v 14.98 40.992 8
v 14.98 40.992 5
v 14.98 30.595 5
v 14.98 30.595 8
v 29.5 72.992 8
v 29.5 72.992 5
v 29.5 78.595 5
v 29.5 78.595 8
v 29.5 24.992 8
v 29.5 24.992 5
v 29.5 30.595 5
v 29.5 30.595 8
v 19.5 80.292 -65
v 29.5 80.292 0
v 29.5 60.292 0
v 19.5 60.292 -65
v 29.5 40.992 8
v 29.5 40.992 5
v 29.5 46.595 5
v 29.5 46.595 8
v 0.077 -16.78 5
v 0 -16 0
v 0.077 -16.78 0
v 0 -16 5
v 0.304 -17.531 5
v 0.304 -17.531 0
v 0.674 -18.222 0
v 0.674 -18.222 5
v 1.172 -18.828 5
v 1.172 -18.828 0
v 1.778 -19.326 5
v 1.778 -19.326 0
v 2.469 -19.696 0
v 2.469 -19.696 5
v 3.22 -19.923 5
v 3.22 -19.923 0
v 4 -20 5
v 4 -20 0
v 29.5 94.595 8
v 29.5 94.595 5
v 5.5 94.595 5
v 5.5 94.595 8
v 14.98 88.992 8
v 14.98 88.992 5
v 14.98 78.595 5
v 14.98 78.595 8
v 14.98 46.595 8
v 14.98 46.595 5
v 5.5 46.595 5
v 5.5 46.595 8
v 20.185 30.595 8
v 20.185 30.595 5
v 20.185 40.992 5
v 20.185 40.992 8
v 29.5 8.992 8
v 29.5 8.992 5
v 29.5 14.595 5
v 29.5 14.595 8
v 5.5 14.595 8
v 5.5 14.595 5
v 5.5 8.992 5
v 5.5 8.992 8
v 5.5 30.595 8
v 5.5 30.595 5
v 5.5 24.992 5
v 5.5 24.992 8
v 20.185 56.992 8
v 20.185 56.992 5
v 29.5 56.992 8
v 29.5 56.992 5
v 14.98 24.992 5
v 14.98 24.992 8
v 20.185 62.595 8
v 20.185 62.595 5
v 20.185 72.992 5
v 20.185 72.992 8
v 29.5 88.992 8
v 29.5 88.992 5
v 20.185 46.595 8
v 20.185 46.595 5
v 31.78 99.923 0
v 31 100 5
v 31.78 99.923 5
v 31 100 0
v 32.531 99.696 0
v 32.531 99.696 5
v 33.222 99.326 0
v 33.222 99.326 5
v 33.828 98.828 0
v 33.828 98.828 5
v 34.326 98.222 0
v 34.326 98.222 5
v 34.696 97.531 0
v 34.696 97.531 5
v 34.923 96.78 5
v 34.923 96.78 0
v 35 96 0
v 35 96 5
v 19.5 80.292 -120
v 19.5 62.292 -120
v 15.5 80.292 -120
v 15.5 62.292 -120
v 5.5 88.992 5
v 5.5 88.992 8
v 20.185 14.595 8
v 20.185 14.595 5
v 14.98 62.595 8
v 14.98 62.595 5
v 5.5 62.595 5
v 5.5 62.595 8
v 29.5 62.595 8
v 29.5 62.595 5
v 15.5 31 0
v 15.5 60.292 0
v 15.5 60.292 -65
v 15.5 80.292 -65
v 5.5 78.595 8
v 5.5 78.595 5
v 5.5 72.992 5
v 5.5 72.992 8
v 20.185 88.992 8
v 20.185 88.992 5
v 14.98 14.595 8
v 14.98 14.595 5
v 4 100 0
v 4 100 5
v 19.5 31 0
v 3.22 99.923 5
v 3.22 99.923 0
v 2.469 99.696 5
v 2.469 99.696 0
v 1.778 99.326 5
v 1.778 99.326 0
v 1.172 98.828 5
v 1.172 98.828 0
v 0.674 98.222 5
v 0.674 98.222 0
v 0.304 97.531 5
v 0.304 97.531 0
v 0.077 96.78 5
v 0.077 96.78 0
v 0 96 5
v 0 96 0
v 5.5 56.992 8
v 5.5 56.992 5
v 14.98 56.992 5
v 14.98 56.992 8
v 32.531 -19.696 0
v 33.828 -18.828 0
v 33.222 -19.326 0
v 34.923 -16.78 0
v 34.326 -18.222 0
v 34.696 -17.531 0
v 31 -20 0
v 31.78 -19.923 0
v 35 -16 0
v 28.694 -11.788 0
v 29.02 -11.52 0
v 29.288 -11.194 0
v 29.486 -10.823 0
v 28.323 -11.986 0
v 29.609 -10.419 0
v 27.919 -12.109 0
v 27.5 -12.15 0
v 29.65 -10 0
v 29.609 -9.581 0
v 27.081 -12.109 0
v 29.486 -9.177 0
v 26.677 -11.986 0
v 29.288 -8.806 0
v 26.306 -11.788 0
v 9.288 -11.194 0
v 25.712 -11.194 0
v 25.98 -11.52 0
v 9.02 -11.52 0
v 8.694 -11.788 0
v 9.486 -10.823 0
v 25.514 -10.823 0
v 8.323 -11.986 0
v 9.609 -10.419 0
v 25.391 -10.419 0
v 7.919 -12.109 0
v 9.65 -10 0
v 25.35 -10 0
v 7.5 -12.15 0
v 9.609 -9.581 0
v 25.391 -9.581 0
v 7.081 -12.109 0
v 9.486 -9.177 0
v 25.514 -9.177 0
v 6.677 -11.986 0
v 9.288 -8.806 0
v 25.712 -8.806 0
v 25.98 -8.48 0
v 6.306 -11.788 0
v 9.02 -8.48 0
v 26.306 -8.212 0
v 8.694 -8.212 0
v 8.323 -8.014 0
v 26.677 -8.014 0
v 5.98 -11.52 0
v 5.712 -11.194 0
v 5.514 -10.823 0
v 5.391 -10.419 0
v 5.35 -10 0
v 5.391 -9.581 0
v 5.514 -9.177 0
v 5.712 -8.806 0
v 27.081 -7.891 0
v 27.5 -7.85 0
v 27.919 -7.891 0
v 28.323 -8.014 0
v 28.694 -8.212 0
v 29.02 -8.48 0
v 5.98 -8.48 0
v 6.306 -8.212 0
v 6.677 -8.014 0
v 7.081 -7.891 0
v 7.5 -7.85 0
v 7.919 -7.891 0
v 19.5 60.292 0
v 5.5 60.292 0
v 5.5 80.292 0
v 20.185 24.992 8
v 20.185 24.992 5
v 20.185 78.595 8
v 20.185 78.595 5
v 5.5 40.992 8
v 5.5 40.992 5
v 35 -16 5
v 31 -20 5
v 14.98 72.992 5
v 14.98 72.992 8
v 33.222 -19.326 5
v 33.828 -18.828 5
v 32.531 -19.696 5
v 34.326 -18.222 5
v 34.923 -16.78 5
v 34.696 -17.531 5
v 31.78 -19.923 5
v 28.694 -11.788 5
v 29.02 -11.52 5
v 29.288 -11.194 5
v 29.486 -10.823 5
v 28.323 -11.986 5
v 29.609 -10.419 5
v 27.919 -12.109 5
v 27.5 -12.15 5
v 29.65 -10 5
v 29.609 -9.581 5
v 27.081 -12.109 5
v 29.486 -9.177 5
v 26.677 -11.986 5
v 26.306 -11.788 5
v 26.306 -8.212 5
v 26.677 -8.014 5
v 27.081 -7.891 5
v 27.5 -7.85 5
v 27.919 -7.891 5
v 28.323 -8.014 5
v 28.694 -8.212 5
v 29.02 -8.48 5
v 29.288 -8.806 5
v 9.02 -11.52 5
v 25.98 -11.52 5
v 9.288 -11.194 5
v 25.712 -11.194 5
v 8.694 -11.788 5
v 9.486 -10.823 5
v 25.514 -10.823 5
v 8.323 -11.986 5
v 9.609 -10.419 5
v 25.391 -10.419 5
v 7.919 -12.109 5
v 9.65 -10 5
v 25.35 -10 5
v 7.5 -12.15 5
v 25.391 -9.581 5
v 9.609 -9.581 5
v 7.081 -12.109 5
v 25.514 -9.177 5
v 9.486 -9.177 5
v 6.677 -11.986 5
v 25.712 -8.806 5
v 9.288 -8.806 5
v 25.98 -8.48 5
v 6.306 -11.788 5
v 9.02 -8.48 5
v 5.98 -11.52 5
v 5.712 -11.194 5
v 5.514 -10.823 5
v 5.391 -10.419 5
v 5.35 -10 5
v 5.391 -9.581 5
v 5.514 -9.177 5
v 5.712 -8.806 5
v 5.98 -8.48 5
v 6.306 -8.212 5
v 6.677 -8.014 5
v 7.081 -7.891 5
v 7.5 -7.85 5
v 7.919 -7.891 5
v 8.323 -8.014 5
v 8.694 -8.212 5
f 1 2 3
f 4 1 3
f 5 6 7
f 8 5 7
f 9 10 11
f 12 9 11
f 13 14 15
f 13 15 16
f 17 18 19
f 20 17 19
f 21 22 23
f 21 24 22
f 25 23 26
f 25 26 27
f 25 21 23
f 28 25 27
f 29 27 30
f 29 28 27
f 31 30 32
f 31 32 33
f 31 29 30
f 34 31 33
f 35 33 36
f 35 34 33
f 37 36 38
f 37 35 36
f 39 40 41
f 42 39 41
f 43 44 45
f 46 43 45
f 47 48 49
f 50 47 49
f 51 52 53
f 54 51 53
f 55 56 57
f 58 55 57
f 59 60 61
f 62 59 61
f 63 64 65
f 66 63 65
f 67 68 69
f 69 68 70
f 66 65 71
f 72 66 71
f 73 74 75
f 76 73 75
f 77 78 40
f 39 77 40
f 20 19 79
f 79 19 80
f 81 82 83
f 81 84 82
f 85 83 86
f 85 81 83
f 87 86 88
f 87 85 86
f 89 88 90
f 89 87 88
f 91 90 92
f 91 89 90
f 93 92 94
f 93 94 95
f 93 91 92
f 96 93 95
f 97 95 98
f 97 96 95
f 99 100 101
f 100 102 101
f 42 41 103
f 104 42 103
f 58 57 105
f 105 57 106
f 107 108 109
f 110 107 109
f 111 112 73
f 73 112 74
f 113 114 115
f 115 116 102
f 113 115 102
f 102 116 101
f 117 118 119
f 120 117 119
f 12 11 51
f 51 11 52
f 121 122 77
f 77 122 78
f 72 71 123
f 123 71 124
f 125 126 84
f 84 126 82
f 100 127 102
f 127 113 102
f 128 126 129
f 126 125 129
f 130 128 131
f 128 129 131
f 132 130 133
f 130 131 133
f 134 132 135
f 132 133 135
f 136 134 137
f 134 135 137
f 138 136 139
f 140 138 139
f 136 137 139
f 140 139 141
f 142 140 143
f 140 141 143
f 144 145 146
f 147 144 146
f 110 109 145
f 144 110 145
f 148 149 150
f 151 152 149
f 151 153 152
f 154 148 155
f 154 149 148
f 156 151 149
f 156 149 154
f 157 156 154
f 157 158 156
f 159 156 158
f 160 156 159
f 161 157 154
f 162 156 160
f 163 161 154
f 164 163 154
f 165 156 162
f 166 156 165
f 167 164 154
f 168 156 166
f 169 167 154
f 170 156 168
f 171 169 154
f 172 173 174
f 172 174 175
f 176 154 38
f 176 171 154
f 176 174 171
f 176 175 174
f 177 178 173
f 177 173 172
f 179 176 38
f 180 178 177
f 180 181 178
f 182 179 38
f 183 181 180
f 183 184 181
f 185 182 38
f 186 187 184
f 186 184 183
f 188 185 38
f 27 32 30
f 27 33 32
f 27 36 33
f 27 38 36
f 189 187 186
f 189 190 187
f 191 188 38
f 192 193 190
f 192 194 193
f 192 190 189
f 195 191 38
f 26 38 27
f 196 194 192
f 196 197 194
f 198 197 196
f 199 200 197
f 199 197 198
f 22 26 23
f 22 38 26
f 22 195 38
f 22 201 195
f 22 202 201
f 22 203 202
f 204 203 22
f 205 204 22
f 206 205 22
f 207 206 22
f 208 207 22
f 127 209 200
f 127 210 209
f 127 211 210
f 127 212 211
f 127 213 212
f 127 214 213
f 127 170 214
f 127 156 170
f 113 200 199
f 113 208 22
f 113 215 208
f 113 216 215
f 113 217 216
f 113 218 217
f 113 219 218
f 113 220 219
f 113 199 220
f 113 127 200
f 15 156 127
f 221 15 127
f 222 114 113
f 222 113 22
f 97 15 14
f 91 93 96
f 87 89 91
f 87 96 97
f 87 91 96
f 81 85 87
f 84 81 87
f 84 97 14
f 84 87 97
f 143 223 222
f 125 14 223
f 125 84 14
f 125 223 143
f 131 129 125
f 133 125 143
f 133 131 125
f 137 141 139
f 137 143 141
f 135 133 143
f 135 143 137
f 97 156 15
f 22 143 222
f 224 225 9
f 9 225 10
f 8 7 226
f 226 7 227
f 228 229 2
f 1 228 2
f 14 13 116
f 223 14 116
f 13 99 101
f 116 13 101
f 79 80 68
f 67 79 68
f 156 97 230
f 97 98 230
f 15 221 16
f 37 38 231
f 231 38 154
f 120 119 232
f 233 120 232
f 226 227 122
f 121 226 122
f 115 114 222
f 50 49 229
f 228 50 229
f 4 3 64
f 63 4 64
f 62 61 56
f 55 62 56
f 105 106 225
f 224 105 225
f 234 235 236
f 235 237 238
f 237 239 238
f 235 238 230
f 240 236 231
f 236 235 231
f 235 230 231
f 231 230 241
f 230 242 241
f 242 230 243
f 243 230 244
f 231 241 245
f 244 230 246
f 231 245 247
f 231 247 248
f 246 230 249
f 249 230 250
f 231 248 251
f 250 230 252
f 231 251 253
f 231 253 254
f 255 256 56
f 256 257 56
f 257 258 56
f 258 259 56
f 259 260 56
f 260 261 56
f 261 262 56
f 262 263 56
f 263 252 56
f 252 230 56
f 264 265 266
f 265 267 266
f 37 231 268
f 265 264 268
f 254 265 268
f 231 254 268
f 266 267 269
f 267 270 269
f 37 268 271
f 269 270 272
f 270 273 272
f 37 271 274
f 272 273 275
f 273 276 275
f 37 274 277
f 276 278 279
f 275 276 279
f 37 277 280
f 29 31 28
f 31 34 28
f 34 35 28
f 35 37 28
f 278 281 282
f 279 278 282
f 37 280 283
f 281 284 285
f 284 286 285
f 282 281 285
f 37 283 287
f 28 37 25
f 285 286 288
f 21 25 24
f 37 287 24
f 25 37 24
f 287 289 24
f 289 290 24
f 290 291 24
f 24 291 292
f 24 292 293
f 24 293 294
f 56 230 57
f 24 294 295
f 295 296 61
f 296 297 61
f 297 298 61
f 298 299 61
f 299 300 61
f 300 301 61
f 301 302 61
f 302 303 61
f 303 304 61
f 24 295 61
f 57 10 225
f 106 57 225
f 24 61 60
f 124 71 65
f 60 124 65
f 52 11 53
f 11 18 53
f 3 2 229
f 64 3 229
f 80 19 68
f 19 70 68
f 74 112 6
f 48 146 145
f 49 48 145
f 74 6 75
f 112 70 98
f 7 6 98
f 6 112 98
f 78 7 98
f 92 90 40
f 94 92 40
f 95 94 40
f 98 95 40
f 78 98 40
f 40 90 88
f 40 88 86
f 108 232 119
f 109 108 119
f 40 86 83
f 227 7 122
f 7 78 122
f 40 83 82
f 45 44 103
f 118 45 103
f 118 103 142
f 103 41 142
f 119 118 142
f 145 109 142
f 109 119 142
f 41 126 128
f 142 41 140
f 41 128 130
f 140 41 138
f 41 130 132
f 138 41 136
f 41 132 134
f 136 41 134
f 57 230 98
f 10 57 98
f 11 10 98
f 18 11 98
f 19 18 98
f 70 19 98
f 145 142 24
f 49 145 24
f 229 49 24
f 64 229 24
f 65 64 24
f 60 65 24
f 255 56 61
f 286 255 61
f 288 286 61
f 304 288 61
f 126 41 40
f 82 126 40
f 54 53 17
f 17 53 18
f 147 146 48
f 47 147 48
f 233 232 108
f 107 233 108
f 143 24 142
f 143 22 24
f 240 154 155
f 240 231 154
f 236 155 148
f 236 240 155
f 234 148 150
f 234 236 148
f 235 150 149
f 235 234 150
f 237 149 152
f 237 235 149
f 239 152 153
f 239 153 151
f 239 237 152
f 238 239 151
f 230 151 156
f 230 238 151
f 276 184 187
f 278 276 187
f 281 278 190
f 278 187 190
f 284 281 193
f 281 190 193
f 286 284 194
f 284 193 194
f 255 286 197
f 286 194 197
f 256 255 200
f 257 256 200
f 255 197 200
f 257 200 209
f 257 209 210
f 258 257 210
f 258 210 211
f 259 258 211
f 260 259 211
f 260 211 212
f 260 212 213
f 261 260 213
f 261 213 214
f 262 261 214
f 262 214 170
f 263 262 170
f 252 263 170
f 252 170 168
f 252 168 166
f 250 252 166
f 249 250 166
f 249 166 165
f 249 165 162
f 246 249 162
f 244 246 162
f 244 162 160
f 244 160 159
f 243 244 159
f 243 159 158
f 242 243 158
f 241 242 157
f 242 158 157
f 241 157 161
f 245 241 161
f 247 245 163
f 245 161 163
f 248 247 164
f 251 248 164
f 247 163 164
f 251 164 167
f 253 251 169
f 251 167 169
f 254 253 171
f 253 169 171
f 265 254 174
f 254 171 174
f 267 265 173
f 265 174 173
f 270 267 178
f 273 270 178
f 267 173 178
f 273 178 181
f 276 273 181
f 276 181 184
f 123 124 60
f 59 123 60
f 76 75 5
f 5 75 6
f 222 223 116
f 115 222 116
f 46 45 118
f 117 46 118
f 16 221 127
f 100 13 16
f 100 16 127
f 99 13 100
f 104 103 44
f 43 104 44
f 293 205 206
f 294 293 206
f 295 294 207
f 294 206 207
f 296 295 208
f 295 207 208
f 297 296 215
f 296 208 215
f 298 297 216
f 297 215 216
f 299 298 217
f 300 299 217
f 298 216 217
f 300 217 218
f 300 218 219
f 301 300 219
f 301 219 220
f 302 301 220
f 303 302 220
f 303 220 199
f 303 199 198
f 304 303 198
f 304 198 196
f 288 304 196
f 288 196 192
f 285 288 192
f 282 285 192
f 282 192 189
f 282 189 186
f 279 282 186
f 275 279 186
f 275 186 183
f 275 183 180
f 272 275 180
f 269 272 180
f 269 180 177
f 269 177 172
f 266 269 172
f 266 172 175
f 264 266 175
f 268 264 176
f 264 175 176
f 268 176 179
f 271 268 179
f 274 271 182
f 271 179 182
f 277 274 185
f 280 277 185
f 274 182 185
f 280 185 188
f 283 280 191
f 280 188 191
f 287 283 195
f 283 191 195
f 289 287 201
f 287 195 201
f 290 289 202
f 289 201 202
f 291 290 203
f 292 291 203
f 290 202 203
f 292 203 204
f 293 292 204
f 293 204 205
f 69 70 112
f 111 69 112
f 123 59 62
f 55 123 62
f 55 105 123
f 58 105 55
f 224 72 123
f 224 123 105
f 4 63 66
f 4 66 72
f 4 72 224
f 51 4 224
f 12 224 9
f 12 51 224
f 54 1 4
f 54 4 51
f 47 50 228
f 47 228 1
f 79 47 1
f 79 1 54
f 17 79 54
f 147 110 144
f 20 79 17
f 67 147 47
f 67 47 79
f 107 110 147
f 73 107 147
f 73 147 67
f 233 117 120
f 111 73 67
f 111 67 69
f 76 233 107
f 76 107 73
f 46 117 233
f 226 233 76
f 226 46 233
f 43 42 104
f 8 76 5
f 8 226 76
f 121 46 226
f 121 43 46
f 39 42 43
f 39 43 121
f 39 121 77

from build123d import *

# Parameters (mm, degrees)
SKETCH1_W           = 15
SKETCH1_H           = 100
SKETCH1_W_2         = 35
SKETCH1_H_2         = 20
BOSS_EXTRUDE1_DEPTH = 5
SKETCH3_R           = 2.15
CUT_EXTRUDE1_DEPTH  = 6
BOSS_EXTRUDE3_DEPTH = 5
BOSS_EXTRUDE4_DEPTH = 2
BOSS_EXTRUDE5_DEPTH = 5
BOSS_EXTRUDE6_DEPTH = 20
FILLET3_R           = 4
BOSS_EXTRUDE7_DEPTH = 3


with BuildPart() as part:
    # Sketch1 → Boss-Extrude1 (new body)
    with BuildSketch(Plane.XY):
        with Locations((17.5, 50)):
            Rectangle(SKETCH1_W, SKETCH1_H)
        with Locations((17.5, -10)):
            Rectangle(SKETCH1_W_2, SKETCH1_H_2)
    extrude(amount=BOSS_EXTRUDE1_DEPTH)

    # Sketch3 → Cut-Extrude1 (cut, through all)
    with BuildSketch(Plane(origin=(0, 0, 0), x_dir=(-1, 0, 0), z_dir=(0, 0, -1))):
        with Locations((-27.5, -10)):
            Circle(SKETCH3_R)
        with Locations((-7.5, -10)):
            Circle(SKETCH3_R)
    extrude(amount=-CUT_EXTRUDE1_DEPTH, mode=Mode.SUBTRACT)

    # Sketch4 → Boss-Extrude3 (add)
    with BuildSketch(Plane(origin=(0, 0, 0), x_dir=(-1, 0, 0), z_dir=(0, 0, -1))):
        Polygon((-35, 0), (-25, 0), (-25, 62), align=None)
        Polygon((-10, 62), (0, 0), (-10, 0), align=None)
    extrude(amount=-BOSS_EXTRUDE3_DEPTH)

    # Sketch5 → Boss-Extrude4 (add, symmetric)
    with BuildSketch(Plane.ZY.offset(-17.5)):
        Polygon((0, 80.291537197), (0, 31), (-120, 62.291537197), (-120, 80.291537197), align=None)
    extrude(amount=BOSS_EXTRUDE4_DEPTH, both=True)

    # Sketch6 → Boss-Extrude5 (add)
    with BuildSketch(Plane.XY.offset(5)):
        Polygon((35, 100), (35, 0), (25, 62), (25, 100), align=None)
        Polygon((10, 100), (0, 100), (0, 0), (10, 62), align=None)
    extrude(amount=-BOSS_EXTRUDE5_DEPTH)

    # Sketch7 → Boss-Extrude6 (add)
    with BuildSketch(Plane(origin=(0, 80.291537197, 0), x_dir=(1, 0, 0), z_dir=(0, 1, 0))):
        Polygon((15.5, 65), (15.5, 0), (5.5, 0), align=None)
        Polygon((19.5, 0), (29.5, 0), (19.5, 65), align=None)
    extrude(amount=-BOSS_EXTRUDE6_DEPTH)

    # Fillet3
    fillet3_edges = [part.edges().sort_by_distance(p)[0] for p in [
        (35, -20, 2.5),
        (0, -20, 2.5),
        (35, 100, 2.5),
        (0, 100, 2.5),
    ]]
    fillet(fillet3_edges, radius=FILLET3_R)

    # Sketch8 → Boss-Extrude7 (add)
    with BuildSketch(Plane.XY.offset(5)):
        Polygon((14.979978143, 14.595461976), (5.5, 14.595461976), (5.5, 8.99207654), (29.5, 8.99207654), (29.5, 14.595461976), (20.184726016, 14.595461976), (20.184726016, 24.99207654), (29.5, 24.99207654), (29.5, 30.595461976), (20.184726016, 30.595461976), (20.184726016, 40.99207654), (29.5, 40.99207654), (29.5, 46.595461976), (20.184726016, 46.595461976), (20.184726016, 56.99207654), (29.5, 56.99207654), (29.5, 62.595461976), (20.184726016, 62.595461976), (20.184726016, 72.99207654), (29.5, 72.99207654), (29.5, 78.595461976), (20.184726016, 78.595461976), (20.184726016, 88.99207654), (29.5, 88.99207654), (29.5, 94.595461976), (5.5, 94.595461976), (5.5, 88.99207654), (14.979978143, 88.99207654), (14.979978143, 78.595461976), (5.5, 78.595461976), (5.5, 72.99207654), (14.979978143, 72.99207654), (14.979978143, 62.595461976), (5.5, 62.595461976), (5.5, 56.99207654), (14.979978143, 56.99207654), (14.979978143, 46.595461976), (5.5, 46.595461976), (5.5, 40.99207654), (14.979978143, 40.99207654), (14.979978143, 30.595461976), (5.5, 30.595461976), (5.5, 24.99207654), (14.979978143, 24.99207654), align=None)
    extrude(amount=BOSS_EXTRUDE7_DEPTH)


solid = part.part
